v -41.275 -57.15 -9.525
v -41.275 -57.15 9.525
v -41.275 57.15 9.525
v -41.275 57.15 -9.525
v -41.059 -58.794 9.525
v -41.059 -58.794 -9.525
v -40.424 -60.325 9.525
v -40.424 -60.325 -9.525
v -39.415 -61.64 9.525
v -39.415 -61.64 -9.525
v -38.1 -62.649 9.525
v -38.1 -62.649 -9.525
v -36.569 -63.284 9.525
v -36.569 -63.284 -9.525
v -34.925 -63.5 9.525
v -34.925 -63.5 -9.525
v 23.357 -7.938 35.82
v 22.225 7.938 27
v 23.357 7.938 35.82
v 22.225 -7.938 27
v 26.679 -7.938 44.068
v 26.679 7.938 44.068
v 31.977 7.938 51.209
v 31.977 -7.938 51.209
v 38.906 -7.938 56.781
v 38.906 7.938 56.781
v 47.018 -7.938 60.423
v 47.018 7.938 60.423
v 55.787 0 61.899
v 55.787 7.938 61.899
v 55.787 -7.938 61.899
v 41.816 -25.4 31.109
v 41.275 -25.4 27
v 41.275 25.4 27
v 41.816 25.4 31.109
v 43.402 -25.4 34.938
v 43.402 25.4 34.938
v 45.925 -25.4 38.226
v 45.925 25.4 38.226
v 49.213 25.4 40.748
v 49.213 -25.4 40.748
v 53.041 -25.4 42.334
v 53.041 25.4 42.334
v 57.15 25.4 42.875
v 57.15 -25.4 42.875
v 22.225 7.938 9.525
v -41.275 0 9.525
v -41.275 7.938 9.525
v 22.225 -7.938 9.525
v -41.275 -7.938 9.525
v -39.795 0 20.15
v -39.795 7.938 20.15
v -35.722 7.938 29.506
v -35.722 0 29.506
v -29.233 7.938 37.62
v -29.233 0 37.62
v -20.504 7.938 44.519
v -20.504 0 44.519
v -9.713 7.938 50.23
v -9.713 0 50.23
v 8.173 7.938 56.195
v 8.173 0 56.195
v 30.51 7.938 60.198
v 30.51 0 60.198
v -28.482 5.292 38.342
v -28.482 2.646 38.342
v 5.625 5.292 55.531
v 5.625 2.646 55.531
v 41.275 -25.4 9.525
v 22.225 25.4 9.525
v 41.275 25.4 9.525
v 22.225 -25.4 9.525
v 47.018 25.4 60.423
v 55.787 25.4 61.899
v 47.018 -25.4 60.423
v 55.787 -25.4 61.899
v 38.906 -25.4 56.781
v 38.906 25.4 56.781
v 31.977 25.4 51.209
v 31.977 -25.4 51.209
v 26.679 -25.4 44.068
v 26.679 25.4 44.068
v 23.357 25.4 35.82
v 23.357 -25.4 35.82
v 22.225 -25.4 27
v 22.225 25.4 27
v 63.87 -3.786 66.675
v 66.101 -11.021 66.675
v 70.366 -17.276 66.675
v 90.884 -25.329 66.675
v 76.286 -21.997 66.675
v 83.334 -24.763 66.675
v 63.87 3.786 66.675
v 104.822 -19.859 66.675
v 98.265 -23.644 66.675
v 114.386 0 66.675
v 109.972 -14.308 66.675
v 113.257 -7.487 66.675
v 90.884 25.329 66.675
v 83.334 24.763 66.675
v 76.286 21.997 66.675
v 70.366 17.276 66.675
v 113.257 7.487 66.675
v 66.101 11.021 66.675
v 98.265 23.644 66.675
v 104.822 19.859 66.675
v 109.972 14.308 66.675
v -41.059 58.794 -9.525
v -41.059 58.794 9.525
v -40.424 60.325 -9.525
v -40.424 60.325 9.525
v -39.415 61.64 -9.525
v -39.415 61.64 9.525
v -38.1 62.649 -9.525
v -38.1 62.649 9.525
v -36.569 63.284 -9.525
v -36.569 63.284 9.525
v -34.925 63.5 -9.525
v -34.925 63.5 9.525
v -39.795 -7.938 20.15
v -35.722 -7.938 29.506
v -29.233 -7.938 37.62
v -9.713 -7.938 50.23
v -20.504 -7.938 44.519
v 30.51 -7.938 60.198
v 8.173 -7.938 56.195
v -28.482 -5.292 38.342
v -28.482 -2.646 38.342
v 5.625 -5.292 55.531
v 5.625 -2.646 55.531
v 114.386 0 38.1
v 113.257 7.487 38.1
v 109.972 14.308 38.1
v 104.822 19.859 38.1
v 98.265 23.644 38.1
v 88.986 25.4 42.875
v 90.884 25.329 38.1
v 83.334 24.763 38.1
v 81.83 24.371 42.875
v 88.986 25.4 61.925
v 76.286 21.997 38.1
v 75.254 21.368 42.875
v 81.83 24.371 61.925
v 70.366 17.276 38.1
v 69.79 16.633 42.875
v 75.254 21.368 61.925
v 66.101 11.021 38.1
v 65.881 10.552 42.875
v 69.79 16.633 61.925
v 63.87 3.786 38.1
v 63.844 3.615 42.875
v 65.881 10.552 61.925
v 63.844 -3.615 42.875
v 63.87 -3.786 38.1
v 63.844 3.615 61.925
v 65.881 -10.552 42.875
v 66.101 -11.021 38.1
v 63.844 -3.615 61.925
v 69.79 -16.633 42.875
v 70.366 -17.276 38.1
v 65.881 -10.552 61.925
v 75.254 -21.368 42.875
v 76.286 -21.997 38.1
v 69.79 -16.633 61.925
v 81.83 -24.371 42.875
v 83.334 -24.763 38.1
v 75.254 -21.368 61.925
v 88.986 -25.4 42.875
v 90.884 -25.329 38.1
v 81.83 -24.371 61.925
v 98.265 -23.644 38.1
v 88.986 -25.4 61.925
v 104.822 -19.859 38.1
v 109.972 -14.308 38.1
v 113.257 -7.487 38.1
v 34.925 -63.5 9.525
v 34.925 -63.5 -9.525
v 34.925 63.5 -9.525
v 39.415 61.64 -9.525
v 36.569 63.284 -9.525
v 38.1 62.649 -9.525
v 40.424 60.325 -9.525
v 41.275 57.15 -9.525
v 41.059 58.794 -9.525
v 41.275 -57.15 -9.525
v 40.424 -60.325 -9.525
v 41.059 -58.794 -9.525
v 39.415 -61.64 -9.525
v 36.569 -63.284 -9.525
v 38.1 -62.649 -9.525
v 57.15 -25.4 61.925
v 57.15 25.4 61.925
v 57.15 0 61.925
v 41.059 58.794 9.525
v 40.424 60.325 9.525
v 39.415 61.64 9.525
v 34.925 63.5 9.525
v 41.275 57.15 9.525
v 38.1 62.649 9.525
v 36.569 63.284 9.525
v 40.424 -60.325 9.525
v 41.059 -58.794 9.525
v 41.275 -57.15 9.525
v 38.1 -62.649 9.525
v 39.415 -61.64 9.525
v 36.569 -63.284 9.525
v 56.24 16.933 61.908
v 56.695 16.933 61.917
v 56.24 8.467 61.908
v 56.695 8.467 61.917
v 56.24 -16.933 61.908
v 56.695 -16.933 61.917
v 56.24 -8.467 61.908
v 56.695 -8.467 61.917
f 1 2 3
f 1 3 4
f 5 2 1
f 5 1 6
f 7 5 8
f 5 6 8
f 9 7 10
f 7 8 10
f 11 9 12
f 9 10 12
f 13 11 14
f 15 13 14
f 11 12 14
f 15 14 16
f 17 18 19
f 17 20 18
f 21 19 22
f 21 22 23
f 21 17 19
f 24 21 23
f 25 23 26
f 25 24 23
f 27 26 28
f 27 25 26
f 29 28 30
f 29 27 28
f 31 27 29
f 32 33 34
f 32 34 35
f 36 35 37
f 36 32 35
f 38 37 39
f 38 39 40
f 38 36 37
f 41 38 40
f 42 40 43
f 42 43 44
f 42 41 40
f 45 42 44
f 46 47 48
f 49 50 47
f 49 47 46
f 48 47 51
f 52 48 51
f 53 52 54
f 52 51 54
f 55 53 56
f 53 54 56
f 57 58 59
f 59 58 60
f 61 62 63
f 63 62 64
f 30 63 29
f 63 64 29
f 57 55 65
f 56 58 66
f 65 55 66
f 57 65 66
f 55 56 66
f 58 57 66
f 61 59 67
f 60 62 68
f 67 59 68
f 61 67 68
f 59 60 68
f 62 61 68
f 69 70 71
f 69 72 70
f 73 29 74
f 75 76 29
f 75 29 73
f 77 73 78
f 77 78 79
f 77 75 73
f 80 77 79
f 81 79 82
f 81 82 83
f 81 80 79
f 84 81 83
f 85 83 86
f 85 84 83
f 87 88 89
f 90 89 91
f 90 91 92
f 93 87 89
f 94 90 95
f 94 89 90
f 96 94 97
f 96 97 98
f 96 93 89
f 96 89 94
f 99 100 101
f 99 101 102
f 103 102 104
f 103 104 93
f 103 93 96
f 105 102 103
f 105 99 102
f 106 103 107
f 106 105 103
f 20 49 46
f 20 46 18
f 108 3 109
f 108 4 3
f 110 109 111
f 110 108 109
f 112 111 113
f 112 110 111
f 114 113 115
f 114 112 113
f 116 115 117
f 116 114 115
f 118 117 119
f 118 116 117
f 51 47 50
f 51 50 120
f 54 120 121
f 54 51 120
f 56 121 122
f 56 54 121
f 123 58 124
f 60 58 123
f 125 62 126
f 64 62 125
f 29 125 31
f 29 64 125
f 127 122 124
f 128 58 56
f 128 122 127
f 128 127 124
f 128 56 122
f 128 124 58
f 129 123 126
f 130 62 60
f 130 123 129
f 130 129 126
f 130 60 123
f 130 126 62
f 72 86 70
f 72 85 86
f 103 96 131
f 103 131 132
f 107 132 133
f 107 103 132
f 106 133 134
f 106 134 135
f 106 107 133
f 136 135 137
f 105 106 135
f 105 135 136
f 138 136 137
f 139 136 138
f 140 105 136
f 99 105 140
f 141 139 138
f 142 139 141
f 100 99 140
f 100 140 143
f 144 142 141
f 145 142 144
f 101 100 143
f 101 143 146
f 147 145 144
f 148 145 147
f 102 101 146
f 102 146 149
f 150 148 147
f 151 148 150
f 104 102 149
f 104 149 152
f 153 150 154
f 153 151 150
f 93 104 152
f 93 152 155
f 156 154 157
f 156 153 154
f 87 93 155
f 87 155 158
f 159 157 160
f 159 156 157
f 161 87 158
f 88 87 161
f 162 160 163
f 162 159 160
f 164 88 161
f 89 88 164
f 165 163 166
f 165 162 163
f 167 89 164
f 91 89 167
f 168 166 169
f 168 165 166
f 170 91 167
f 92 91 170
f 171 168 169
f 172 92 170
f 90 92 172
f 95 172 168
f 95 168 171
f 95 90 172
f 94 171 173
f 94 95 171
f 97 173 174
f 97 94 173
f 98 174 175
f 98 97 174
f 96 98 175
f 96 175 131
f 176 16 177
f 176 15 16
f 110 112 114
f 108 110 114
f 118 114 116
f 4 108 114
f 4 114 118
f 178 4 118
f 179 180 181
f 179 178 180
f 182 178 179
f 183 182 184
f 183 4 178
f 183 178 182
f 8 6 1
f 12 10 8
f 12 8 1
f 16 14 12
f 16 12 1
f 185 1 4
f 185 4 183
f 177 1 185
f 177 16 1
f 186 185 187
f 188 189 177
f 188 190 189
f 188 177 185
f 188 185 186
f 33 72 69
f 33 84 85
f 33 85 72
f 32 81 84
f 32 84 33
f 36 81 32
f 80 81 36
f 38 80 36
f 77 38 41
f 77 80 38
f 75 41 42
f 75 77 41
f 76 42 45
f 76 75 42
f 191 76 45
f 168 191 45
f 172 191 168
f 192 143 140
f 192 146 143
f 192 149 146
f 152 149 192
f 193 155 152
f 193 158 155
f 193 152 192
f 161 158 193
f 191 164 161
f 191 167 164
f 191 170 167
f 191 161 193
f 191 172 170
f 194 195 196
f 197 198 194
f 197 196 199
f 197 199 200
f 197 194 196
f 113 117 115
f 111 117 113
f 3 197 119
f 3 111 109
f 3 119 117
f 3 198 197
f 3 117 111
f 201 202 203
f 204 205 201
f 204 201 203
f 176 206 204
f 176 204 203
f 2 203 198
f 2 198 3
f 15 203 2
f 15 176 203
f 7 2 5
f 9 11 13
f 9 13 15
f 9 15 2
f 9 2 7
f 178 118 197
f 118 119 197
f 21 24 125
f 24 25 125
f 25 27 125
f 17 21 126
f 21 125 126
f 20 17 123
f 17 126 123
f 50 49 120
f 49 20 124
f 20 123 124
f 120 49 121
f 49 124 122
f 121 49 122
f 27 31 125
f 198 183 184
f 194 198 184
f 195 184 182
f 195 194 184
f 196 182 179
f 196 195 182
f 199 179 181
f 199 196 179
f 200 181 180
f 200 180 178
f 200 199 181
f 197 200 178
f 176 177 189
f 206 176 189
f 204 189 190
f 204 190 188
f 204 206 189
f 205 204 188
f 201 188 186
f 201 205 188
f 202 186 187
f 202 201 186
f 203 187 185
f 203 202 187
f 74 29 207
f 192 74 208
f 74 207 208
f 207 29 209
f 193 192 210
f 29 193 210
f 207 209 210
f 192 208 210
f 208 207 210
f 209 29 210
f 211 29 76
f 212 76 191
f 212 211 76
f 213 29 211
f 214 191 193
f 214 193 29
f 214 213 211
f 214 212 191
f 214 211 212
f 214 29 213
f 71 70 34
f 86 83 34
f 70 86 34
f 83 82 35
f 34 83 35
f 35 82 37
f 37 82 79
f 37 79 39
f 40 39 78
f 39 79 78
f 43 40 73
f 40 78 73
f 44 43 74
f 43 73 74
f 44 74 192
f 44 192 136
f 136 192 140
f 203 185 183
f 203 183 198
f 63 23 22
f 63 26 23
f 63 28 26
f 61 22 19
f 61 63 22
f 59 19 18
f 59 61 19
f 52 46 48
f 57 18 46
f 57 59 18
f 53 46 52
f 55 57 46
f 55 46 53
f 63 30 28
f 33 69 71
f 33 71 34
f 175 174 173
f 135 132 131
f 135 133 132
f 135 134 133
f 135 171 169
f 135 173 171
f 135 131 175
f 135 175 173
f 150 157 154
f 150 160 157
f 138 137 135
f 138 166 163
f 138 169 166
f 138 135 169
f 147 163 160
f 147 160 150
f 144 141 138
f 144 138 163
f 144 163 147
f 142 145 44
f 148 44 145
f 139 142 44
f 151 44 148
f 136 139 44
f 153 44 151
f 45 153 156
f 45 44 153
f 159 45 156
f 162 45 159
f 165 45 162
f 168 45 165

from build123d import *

# Parameters (mm, degrees)
F1_DEPTH = 63.5
F0_W     = 25.4
F0_H     = 19.05
F2_DEPTH = 25.4
F3_DEPTH = 7.9375
F5_R     = 6.35


with BuildPart() as f1:
    # F0 (on Front) → F1 (new body, symmetric)
    with BuildSketch(Plane.XZ):
        Polygon((-41.275, -9.525), (41.275, -9.525), (41.275, 9.525), (22.225, 9.525), (-41.275, 9.525), align=None)
    extrude(amount=F1_DEPTH, both=True)

    # F5
    f5_edges = [f1.edges().sort_by_distance(p)[0] for p in [
        (-41.275, -63.5, 0),
        (41.275, -63.5, 0),
        (41.275, 63.5, 0),
        (-41.275, 63.5, 0),
    ]]
    fillet(f5_edges, radius=F5_R)


with BuildPart() as f2:
    # F0 (on Front) → F2 (new body, symmetric)
    with BuildSketch(Plane.XZ):
        with BuildLine():
            Line((22.225, 9.525), (41.275, 9.525))
            Line((41.275, 9.525), (41.275, 27.0002))
            ThreePointArc((41.275, 27.0002), (45.9246798487, 38.2255201513), (57.15, 42.8752))
            Line((57.15, 42.8752), (63.585810169, 42.8752))
            Line((63.585810169, 42.8752), (63.585810169, 61.9252))
            Line((63.585810169, 61.9252), (57.15, 61.9252))
            add(Edge.make_bspline(
                [(55.7865879403, 61.8985772195), (56.240017403, 61.9084206503), (56.6944921809, 61.9172942833), (57.15, 61.9252)],
                knots=[110.6158014639, 110.6158014639, 110.6158014639, 110.6158014639, 111.5045361635, 111.5045361635, 111.5045361635, 111.5045361635], degree=3))
            ThreePointArc((55.7865879403, 61.8985772195), (31.9768715573, 51.2090667518), (22.225, 27.0002))
            Line((22.225, 27.0002), (22.225, 9.525))
        make_face()
        with Locations((76.285810169, 52.4002)):
            Rectangle(F0_W, F0_H)
    extrude(amount=F2_DEPTH, both=True)

    # F0 (on Front) → F4 (revolve)
    with BuildSketch(Plane.XZ):
        Polygon((88.985810169, 61.9252), (88.985810169, 42.8752), (88.985810169, 38.1), (114.385810169, 38.1), (114.385810169, 66.675), (88.985810169, 66.675), align=None)
    revolve(axis=Axis((88.985810169, 0, 52.3875), (0, 0, 1)))


with BuildPart() as f3:
    # F0 (on Front) → F3 (new body, symmetric)
    with BuildSketch(Plane.XZ):
        with BuildLine():
            add(Edge.make_bspline(
                [(-41.275, 9.525), (-40.8916613319, 44.4247603482), (-0.6492229388, 60.6734208425), (55.7865879403, 61.8985772195)],
                knots=[0, 0, 0, 0, 110.6158014639, 110.6158014639, 110.6158014639, 110.6158014639], degree=3))
            Line((-41.275, 9.525), (22.225, 9.525))
            Line((22.225, 9.525), (22.225, 27.0002))
            ThreePointArc((22.225, 27.0002), (31.9768715573, 51.2090667518), (55.7865879403, 61.8985772195))
        make_face()
    extrude(amount=F3_DEPTH, both=True)


solid = Compound([f1.part, f2.part, f3.part])
